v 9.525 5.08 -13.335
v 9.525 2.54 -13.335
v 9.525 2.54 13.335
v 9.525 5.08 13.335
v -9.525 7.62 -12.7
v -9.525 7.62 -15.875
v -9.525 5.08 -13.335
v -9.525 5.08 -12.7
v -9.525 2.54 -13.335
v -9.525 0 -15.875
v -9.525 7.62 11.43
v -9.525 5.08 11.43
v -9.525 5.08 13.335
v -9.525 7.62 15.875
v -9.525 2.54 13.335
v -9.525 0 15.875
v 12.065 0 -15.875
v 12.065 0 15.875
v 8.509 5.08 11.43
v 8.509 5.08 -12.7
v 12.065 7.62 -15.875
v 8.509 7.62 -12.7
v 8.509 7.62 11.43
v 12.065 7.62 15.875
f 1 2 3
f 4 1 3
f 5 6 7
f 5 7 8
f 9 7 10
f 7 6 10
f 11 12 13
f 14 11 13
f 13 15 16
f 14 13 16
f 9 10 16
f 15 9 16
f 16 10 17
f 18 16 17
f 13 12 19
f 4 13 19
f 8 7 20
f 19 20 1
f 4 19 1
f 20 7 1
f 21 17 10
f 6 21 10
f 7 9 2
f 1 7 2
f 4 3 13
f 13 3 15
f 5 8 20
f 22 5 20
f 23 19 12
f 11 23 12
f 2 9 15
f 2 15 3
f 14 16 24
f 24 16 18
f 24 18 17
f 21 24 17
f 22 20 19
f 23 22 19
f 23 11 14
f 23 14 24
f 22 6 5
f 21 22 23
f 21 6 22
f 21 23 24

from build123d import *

# Parameters (mm, degrees)
SKETCH1_W           = 24.13
SKETCH1_H           = 31.75
BOSS_EXTRUDE1_DEPTH = 2.54
BOSS_EXTRUDE2_DEPTH = 2.54
SKETCH3_W           = 31.75
SKETCH3_H           = 5.08
CUT_EXTRUDE1_DEPTH  = 2.54
BOSS_EXTRUDE3_DEPTH = 2.54
SKETCH5_R           = 2.5527
BOSS_EXTRUDE4_DEPTH = 2.54


with BuildPart() as part:
    # Sketch1 → Boss-Extrude1 (new body)
    with BuildSketch(Plane(origin=(0, 0, 0), x_dir=(1, 0, 0), z_dir=(0, 1, 0))):
        Rectangle(SKETCH1_W, SKETCH1_H)
    extrude(amount=BOSS_EXTRUDE1_DEPTH)

    # Sketch2 → Boss-Extrude2 (add)
    with BuildSketch(Plane(origin=(0, 2.54, 0), x_dir=(1, 0, 0), z_dir=(0, 1, 0))):
        Polygon((-12.065, 15.875), (-12.065, 13.335), (-9.525, 13.335), (9.525, 13.335), (9.525, -13.335), (-9.525, -13.335), (-12.065, -13.335), (-12.065, -15.875), (12.065, -15.875), (12.065, 15.875), align=None)
    extrude(amount=BOSS_EXTRUDE2_DEPTH)

    # Sketch3 → Cut-Extrude1 (cut)
    with BuildSketch(Plane.ZY.offset(12.065)):
        with Locations((0, 2.54)):
            Rectangle(SKETCH3_W, SKETCH3_H)
    extrude(amount=-CUT_EXTRUDE1_DEPTH, mode=Mode.SUBTRACT)

    # Sketch4 → Boss-Extrude3 (add)
    with BuildSketch(Plane(origin=(0, 5.08, 0), x_dir=(1, 0, 0), z_dir=(0, 1, 0))):
        Polygon((-9.525, 15.875), (-9.525, 12.7), (8.509, 12.7), (8.509, -11.43), (-9.525, -11.43), (-9.525, -15.875), (12.065, -15.875), (12.065, 15.875), align=None)
    extrude(amount=BOSS_EXTRUDE3_DEPTH)

    # Sketch5 → Boss-Extrude4 (add)
    # profile 1 of 2: a face of its own
    with BuildSketch(Plane(origin=(0, 0, 0), x_dir=(-1, 0, 0), z_dir=(0, -1, 0))):
        with BuildLine():
            Line((-12.065, 6.35), (-12.065, -6.35))
            Line((-12.065, -6.35), (-18.415, -6.35))
            ThreePointArc((-18.415, -6.35), (-22.905128061, -4.490128061), (-24.765, 0))
            ThreePointArc((-24.765, 0), (-22.905128061, 4.490128061), (-18.415, 6.35))
            Line((-18.415, 6.35), (-12.065, 6.35))
        make_face()
        with Locations((-18.415, 0)):
            Circle(SKETCH5_R, mode=Mode.SUBTRACT)
    # profile 2 of 2: a face of its own
    with BuildSketch(Plane(origin=(0, 0, 0), x_dir=(-1, 0, 0), z_dir=(0, -1, 0))):
        with BuildLine():
            Line((9.525, 6.35), (15.875, 6.35))
            ThreePointArc((15.875, 6.35), (20.365128061, 4.490128061), (22.225, 0))
            ThreePointArc((22.225, 0), (20.365128061, -4.490128061), (15.875, -6.35))
            Line((15.875, -6.35), (9.525, -6.35))
            Line((9.525, -6.35), (9.525, 6.35))
        make_face()
        with Locations((15.875, 0)):
            Circle(SKETCH5_R, mode=Mode.SUBTRACT)
    extrude(amount=BOSS_EXTRUDE4_DEPTH)


with BuildPart() as boss_extrude4_kept_piece:
    # of the separate pieces the step leaves, the one the design keeps (boss_extrude4_pieces_kept)
    add(part.part.solids().sort_by_distance((12.065, 0, 15.875))[0])


solid = boss_extrude4_kept_piece.part
